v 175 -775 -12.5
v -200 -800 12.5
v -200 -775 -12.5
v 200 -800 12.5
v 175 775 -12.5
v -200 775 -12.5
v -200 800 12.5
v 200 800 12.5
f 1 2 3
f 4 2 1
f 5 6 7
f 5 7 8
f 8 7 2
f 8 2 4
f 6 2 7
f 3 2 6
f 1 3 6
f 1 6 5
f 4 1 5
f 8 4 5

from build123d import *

# Parameters (mm, degrees)
F0_W     = 400
F0_H     = 1600
F1_DEPTH = 12.5
F2_SIZE  = 24.99999


# Not quite as in the source:
# - a fillet or chamfer is up to 0.001 mm smaller than in the source, because OpenCascade refuses the exact size


with BuildPart() as f1:
    # F0 (on Top) → F1 (new body, symmetric)
    with BuildSketch(Plane.XY):
        Rectangle(F0_W, F0_H)
    extrude(amount=F1_DEPTH, both=True)

    # F2 (size 25 in the source; OpenCascade refuses exactly that, so slightly less here)
    f2_edges = [f1.edges().sort_by_distance(p)[0] for p in [
        (0, -800, -12.5),
        (0, 800, -12.5),
        (200, 0, -12.5),
    ]]
    chamfer(f2_edges, length=F2_SIZE)


solid = f1.part
